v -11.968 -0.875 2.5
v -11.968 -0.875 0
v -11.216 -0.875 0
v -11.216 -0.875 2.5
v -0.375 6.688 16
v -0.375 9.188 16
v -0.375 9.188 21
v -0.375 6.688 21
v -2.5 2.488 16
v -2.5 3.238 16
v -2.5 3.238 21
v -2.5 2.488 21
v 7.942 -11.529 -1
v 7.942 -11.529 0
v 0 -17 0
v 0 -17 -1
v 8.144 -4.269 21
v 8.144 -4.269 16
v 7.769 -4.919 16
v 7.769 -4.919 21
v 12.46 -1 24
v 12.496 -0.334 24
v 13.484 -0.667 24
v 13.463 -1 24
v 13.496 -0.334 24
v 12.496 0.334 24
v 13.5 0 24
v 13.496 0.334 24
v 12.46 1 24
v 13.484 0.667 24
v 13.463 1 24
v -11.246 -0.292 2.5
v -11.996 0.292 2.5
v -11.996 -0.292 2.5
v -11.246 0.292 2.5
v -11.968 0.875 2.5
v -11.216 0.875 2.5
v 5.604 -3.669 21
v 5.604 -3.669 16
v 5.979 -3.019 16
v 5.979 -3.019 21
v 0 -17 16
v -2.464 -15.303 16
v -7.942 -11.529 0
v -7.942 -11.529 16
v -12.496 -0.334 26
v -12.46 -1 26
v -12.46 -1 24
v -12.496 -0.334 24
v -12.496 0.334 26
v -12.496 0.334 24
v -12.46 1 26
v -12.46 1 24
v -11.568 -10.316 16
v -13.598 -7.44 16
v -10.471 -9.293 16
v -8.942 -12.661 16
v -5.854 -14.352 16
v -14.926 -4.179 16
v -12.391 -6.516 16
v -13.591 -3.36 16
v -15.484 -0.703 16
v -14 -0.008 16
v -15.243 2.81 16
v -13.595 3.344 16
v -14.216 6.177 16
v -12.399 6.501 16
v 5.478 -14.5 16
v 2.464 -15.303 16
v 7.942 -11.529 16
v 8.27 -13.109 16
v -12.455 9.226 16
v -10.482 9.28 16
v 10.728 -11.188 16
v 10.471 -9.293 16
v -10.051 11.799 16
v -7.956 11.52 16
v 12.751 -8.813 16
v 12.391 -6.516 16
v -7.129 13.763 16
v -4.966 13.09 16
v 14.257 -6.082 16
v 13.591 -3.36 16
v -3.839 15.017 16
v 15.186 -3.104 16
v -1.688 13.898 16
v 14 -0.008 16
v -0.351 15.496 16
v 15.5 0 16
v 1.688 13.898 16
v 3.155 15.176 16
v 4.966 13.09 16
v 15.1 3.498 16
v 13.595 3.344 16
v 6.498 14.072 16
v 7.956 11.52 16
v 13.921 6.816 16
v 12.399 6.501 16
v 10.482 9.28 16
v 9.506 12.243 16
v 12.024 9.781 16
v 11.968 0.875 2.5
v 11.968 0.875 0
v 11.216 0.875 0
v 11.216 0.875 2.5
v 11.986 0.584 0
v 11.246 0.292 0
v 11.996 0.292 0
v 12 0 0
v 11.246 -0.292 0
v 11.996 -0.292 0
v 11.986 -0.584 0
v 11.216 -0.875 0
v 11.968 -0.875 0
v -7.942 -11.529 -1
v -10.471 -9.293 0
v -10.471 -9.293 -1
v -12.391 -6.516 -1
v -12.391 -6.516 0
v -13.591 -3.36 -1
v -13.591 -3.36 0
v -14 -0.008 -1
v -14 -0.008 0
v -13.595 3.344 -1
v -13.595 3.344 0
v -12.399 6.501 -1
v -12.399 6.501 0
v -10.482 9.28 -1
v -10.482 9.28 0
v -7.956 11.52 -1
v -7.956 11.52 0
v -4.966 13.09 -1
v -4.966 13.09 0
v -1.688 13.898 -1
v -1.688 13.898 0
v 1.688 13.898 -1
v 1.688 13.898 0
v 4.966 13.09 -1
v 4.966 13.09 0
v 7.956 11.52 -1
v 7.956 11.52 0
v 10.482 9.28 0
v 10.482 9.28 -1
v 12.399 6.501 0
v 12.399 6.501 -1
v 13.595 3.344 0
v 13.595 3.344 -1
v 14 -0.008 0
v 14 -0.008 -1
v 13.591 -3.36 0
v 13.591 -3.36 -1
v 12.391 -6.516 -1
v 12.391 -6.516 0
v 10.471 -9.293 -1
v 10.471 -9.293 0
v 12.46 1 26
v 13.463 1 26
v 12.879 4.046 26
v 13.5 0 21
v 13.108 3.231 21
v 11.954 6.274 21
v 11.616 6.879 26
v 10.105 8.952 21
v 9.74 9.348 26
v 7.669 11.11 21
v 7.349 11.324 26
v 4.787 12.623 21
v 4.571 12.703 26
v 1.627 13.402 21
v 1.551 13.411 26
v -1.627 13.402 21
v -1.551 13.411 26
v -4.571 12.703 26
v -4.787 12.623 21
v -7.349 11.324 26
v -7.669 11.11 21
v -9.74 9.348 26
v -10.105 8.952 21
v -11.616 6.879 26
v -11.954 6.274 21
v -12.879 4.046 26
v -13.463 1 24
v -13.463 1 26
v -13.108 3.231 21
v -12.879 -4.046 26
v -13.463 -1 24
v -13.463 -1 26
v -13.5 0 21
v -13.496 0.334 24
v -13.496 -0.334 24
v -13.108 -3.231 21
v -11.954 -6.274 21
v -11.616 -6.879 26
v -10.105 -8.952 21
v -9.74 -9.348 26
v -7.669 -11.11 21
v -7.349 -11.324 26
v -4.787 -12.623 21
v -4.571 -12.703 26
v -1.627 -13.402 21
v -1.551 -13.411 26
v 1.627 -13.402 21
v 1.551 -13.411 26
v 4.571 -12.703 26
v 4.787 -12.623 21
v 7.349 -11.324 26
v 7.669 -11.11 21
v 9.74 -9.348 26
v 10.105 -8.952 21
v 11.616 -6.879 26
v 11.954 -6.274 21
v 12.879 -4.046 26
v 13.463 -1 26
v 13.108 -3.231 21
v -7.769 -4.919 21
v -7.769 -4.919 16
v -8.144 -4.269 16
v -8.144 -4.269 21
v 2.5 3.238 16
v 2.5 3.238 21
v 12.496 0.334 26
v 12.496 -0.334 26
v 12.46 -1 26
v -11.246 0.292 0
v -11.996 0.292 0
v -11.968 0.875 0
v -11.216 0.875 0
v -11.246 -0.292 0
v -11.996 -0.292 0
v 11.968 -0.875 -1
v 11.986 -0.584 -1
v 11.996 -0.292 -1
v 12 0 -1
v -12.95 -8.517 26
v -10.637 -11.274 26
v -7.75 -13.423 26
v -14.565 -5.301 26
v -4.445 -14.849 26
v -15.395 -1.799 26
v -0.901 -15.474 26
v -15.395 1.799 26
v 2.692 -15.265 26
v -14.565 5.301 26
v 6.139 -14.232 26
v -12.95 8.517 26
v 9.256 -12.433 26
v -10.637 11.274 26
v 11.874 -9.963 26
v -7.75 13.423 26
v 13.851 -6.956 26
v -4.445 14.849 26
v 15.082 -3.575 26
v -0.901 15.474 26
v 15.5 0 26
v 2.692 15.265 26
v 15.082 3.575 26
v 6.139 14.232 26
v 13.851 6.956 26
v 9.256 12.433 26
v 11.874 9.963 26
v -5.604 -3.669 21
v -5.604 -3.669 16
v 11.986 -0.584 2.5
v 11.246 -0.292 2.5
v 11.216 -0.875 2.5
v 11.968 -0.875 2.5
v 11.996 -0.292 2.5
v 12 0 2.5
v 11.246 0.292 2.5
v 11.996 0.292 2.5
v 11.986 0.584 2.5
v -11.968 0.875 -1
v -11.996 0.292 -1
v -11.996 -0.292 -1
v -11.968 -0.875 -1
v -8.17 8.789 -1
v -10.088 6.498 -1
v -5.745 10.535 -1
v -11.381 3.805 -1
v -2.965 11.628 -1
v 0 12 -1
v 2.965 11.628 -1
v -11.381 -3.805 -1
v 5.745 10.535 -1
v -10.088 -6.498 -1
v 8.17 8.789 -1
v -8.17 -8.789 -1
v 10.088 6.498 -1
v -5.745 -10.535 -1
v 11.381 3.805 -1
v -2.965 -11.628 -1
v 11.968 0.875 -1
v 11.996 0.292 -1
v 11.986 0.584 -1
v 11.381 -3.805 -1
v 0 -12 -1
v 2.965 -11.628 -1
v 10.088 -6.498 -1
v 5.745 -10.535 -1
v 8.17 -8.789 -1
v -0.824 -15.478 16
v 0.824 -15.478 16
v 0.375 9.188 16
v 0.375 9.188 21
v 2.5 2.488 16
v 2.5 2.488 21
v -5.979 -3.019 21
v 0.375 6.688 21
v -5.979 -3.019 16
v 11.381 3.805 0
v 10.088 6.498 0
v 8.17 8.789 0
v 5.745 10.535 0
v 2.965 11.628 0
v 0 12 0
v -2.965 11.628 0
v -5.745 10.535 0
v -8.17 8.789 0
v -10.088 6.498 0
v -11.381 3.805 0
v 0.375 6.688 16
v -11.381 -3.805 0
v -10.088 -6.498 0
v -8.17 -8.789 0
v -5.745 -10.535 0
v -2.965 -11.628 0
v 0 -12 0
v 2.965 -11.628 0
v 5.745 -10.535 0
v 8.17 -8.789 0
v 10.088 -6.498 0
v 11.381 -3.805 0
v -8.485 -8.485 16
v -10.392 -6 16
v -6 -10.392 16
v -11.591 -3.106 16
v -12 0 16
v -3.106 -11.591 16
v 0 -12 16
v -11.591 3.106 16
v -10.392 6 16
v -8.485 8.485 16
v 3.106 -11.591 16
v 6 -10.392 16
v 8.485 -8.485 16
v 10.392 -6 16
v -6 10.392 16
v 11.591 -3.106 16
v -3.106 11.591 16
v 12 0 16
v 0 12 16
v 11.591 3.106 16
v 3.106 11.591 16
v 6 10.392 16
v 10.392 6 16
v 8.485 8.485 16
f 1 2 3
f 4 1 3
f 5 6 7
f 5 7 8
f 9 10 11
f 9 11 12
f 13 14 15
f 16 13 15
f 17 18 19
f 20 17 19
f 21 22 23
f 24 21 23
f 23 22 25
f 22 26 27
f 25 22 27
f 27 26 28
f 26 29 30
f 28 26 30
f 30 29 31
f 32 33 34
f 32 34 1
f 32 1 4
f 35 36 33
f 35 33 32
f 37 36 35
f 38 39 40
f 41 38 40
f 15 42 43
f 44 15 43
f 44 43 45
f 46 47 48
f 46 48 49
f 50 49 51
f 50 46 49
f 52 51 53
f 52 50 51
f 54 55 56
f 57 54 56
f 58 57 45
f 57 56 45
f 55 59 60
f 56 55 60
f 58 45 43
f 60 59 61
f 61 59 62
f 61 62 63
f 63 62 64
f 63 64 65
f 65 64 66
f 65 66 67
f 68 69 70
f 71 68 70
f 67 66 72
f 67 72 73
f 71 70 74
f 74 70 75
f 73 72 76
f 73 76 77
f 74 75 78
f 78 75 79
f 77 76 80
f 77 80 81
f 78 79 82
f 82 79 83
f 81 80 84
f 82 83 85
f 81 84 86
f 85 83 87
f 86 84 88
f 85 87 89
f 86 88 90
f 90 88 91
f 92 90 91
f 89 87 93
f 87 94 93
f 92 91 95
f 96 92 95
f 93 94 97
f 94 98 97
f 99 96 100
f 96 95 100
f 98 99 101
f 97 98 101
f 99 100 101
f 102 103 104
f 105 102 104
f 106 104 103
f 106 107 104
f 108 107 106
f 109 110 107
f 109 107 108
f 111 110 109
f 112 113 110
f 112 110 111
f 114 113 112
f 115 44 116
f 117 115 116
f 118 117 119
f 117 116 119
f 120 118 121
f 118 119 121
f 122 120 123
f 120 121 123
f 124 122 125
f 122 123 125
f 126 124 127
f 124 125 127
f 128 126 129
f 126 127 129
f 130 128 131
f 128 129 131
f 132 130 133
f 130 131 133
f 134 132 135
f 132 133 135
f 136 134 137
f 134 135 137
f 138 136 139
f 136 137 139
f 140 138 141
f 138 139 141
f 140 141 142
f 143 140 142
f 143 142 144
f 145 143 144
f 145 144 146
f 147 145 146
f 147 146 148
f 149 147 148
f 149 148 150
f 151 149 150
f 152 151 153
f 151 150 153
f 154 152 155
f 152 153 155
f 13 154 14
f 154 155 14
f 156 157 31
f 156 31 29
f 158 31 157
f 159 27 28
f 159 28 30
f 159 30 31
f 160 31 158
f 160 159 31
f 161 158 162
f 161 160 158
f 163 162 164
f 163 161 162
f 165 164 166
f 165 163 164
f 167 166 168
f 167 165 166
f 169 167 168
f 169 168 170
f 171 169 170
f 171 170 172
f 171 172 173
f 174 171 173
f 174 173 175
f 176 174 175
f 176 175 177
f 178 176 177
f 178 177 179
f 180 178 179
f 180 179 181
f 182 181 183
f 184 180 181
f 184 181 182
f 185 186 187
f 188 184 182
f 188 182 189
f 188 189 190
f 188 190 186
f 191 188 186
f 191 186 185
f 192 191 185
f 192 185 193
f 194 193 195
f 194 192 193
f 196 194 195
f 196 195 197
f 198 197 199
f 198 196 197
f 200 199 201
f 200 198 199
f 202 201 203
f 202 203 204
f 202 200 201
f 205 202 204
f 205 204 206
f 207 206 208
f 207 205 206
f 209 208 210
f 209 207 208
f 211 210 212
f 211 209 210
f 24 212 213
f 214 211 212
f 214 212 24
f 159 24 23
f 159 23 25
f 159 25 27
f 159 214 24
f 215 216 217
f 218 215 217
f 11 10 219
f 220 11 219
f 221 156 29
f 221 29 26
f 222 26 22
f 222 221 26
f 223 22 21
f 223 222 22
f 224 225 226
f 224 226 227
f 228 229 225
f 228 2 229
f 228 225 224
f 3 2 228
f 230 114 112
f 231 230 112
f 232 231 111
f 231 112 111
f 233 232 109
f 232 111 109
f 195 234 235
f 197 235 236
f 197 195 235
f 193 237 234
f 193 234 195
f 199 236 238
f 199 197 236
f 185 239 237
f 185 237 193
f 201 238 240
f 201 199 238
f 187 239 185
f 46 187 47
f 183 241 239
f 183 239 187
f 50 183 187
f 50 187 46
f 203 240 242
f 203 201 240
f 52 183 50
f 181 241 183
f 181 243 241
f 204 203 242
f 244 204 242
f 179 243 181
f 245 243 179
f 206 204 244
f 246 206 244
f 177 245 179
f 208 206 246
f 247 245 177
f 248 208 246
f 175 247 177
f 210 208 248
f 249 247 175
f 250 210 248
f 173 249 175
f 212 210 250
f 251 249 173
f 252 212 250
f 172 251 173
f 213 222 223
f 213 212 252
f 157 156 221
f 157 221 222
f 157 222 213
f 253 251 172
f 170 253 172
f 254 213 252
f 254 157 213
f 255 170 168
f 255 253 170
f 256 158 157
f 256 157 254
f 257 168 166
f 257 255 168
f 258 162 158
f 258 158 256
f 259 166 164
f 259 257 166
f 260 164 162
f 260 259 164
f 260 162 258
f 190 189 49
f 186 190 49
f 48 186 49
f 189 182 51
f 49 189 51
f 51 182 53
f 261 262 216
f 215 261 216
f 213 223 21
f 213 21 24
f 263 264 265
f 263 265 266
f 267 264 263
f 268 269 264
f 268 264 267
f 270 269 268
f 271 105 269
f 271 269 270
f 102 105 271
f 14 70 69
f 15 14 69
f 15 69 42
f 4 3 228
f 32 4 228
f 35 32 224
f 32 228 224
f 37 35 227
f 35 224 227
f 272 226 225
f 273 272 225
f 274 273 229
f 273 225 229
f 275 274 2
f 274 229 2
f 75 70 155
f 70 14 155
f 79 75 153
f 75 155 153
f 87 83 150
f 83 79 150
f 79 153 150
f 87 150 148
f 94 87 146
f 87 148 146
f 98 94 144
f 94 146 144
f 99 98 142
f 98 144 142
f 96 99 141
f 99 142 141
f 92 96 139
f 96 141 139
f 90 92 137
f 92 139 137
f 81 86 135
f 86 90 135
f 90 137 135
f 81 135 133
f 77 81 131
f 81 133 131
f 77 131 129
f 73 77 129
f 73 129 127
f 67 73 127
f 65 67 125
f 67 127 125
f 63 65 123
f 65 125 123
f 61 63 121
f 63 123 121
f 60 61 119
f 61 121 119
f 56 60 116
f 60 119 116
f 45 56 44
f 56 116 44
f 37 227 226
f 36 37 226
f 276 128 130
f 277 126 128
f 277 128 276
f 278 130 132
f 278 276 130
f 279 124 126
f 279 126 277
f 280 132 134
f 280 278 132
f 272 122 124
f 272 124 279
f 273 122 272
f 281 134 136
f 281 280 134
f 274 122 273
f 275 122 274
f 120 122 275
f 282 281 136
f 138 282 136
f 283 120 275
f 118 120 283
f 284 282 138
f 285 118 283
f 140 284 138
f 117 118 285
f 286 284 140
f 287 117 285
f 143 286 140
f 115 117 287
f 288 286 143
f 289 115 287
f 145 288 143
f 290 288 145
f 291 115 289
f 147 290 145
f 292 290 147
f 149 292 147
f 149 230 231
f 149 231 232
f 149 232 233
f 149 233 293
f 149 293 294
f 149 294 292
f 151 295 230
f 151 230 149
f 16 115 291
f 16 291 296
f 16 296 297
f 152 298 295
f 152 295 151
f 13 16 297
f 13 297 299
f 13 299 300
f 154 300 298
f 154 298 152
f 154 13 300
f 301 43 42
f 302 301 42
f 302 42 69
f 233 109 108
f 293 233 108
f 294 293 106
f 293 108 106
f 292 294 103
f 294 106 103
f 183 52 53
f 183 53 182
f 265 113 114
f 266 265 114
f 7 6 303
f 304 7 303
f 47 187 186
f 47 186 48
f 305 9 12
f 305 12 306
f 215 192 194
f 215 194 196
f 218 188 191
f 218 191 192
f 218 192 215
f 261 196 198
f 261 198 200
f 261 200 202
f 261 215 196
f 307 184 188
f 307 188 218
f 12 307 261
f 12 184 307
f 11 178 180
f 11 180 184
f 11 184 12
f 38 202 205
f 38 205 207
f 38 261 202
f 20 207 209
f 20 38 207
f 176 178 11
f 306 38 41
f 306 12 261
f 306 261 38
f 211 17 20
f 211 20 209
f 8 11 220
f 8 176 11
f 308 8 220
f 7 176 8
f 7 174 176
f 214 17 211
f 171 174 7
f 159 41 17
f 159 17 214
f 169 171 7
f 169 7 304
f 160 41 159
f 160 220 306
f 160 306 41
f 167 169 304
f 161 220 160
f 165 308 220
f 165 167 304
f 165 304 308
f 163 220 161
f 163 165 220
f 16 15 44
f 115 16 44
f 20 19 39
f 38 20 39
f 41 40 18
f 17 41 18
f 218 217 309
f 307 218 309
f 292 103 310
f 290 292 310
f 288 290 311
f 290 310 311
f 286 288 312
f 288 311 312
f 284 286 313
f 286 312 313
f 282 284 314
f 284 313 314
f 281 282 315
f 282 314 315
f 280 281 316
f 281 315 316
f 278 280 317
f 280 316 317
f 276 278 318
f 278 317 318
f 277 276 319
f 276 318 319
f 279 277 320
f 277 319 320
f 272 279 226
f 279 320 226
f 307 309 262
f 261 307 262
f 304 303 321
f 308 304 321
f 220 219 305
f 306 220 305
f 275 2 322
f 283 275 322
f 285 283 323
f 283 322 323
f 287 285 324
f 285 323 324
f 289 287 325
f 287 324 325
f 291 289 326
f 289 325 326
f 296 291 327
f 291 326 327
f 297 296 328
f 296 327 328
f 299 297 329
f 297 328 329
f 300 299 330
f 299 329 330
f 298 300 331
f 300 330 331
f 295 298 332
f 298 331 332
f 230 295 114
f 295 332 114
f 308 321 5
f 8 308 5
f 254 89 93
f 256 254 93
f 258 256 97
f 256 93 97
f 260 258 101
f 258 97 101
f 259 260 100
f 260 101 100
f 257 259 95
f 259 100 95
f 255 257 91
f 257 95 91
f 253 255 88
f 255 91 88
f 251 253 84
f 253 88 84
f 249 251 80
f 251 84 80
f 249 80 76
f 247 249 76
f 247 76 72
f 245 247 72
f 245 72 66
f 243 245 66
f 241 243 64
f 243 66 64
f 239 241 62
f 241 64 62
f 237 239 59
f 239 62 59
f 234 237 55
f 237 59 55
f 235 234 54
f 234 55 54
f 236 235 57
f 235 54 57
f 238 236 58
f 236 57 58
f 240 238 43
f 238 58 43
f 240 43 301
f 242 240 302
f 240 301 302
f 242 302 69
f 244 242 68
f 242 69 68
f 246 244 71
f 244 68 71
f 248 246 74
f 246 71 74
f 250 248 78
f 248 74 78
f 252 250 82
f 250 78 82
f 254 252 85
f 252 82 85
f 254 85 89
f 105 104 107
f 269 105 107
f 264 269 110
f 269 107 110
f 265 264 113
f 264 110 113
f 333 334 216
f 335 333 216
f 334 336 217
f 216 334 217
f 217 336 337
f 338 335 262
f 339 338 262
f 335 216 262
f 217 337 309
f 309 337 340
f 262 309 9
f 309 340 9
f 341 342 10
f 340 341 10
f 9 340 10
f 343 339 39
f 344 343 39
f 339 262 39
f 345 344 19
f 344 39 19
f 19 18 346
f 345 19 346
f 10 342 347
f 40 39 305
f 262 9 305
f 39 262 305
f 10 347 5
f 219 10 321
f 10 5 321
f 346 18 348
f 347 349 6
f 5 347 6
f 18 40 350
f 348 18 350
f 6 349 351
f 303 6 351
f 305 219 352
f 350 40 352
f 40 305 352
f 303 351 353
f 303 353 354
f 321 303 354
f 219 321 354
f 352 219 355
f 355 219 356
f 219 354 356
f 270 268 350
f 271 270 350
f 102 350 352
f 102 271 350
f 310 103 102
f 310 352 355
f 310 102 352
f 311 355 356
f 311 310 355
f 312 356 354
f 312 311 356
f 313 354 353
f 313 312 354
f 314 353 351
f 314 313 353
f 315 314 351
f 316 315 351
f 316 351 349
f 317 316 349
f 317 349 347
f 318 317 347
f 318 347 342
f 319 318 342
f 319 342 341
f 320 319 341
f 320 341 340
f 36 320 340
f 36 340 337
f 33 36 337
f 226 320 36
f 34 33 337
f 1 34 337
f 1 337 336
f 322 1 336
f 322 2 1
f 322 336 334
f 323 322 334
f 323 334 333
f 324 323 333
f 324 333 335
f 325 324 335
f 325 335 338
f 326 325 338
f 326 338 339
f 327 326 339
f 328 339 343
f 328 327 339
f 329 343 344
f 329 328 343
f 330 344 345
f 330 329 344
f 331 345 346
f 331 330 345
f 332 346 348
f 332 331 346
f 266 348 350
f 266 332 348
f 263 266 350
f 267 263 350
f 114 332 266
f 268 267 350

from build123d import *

# Parameters (mm, degrees)
F0_R      = 14
F0_R_2    = 12
F1_DEPTH  = 16
F3_DEPTH  = 2.5
F4_R      = 15.5
F5_DEPTH  = 5
F6_W      = 5
F6_H      = 0.75
F6_W_2    = 0.375
F6_H_2    = 2.5
F7_DEPTH  = 5.001
F8_R      = 15.5
F8_R_2    = 13.5
F9_DEPTH  = 5
F11_DEPTH = 2
F13_DEPTH = 16
F15_DEPTH = 1


with BuildPart() as f1:
    # F0 (on Top) → F1 (new body)
    with BuildSketch(Plane.XY):
        Circle(F0_R)
        Circle(F0_R_2, mode=Mode.SUBTRACT)
    extrude(amount=F1_DEPTH)

    # F2 (on Top) → F3 (join)
    with BuildSketch(Plane.XY):
        with BuildLine():
            Line((-11.2159206042, 0.875), (-11.968056442, 0.875))
            ThreePointArc((-11.968056442, 0.875), (-12, 0), (-11.968056442, -0.875))
            Line((-11.968056442, -0.875), (-11.2159206042, -0.875))
            ThreePointArc((-11.2159206042, -0.875), (-11.25, 0), (-11.2159206042, 0.875))
        make_face()
        with BuildLine():
            ThreePointArc((11.968056442, -0.875), (12, 0), (11.968056442, 0.875))
            Line((11.968056442, 0.875), (11.2159206042, 0.875))
            ThreePointArc((11.2159206042, 0.875), (11.25, 0), (11.2159206042, -0.875))
            Line((11.2159206042, -0.875), (11.968056442, -0.875))
        make_face()
    extrude(amount=F3_DEPTH)

    # F4 (on face) → F5 (join)
    with BuildSketch(Plane.XY.offset(16)):
        Circle(F4_R)
    extrude(amount=F5_DEPTH)

    # F6 (on face) → F7 (cut, through all)
    with BuildSketch(Plane(origin=(0, 0, 16), x_dir=(1, 0, 0), z_dir=(0, 0, -1))):
        with Locations((0, -2.8625)):
            Rectangle(F6_W, F6_H)
        with Locations((0.1875, -7.9375)):
            Rectangle(F6_W_2, F6_H_2)
        with Locations((-0.1875, -7.9375)):
            Rectangle(F6_W_2, F6_H_2)
        Polygon((5.6040448878, 3.6685095264), (5.7915448878, 3.34375), (7.9566083973, 4.59375), (7.7691083973, 4.9185095264), align=None)
        Polygon((7.9566083973, 4.59375), (5.7915448878, 3.34375), (5.9790448878, 3.0189904736), (8.1441083973, 4.2689904736), align=None)
        Polygon((-5.9790448878, 3.0189904736), (-5.7915448878, 3.34375), (-7.9566083973, 4.59375), (-8.1441083973, 4.2689904736), align=None)
        Polygon((-7.9566083973, 4.59375), (-5.7915448878, 3.34375), (-5.6040448878, 3.6685095264), (-7.7691083973, 4.9185095264), align=None)
    extrude(amount=-F7_DEPTH, mode=Mode.SUBTRACT)

    # F8 (on face) → F9 (join)
    with BuildSketch(Plane.XY.offset(21)):
        Circle(F8_R)
        Circle(F8_R_2, mode=Mode.SUBTRACT)
    extrude(amount=F9_DEPTH)

    # F10 (on face) → F11 (join)
    with BuildSketch(Plane.XY.offset(26)):
        with BuildLine():
            Line((-12.4599357944, 1), (-13.4629120178, 1))
            ThreePointArc((-13.4629120178, 1), (-13.5, 0), (-13.4629120178, -1))
            Line((-13.4629120178, -1), (-12.4599357944, -1))
            ThreePointArc((-12.4599357944, -1), (-12.5, 0), (-12.4599357944, 1))
        make_face()
        with BuildLine():
            Line((13.4629120178, 1), (12.4599357944, 1))
            ThreePointArc((12.4599357944, 1), (12.5, 0), (12.4599357944, -1))
            Line((12.4599357944, -1), (13.4629120178, -1))
            ThreePointArc((13.4629120178, -1), (13.5, 0), (13.4629120178, 1))
        make_face()
    extrude(amount=-F11_DEPTH)

    # F12 (on face) → F13 (join, through all)
    with BuildSketch(Plane(origin=(0, 0, 16), x_dir=(1, 0, 0), z_dir=(0, 0, -1))):
        with BuildLine():
            ThreePointArc((-7.9418300385, 11.5294117647), (0, 14), (7.9418300385, 11.5294117647))
            Line((7.9418300385, 11.5294117647), (0, 17))
            Line((0, 17), (-7.9418300385, 11.5294117647))
        make_face()
    extrude(amount=F13_DEPTH)

    # F14 (on face) → F15 (join)
    with BuildSketch(Plane(origin=(0, 0, 0), x_dir=(1, 0, 0), z_dir=(0, 0, -1))):
        with BuildLine():
            ThreePointArc((-7.9418300385, 11.5294117647), (0, -14), (7.9418300385, 11.5294117647))
            Line((7.9418300385, 11.5294117647), (0, 17))
            Line((0, 17), (-7.9418300385, 11.5294117647))
        make_face()
        with BuildLine():
            ThreePointArc((11.968056442, 0.875), (11.9920114515, 0.4377914432), (12, 0))
            ThreePointArc((12, 0), (11.9920114515, -0.4377914432), (11.968056442, -0.875))
            ThreePointArc((11.968056442, -0.875), (0, -12), (-11.968056442, -0.875))
            ThreePointArc((-11.968056442, -0.875), (-12, 0), (-11.968056442, 0.875))
            ThreePointArc((-11.968056442, 0.875), (0, 12), (11.968056442, 0.875))
        make_face(mode=Mode.SUBTRACT)
    extrude(amount=F15_DEPTH)


solid = f1.part
